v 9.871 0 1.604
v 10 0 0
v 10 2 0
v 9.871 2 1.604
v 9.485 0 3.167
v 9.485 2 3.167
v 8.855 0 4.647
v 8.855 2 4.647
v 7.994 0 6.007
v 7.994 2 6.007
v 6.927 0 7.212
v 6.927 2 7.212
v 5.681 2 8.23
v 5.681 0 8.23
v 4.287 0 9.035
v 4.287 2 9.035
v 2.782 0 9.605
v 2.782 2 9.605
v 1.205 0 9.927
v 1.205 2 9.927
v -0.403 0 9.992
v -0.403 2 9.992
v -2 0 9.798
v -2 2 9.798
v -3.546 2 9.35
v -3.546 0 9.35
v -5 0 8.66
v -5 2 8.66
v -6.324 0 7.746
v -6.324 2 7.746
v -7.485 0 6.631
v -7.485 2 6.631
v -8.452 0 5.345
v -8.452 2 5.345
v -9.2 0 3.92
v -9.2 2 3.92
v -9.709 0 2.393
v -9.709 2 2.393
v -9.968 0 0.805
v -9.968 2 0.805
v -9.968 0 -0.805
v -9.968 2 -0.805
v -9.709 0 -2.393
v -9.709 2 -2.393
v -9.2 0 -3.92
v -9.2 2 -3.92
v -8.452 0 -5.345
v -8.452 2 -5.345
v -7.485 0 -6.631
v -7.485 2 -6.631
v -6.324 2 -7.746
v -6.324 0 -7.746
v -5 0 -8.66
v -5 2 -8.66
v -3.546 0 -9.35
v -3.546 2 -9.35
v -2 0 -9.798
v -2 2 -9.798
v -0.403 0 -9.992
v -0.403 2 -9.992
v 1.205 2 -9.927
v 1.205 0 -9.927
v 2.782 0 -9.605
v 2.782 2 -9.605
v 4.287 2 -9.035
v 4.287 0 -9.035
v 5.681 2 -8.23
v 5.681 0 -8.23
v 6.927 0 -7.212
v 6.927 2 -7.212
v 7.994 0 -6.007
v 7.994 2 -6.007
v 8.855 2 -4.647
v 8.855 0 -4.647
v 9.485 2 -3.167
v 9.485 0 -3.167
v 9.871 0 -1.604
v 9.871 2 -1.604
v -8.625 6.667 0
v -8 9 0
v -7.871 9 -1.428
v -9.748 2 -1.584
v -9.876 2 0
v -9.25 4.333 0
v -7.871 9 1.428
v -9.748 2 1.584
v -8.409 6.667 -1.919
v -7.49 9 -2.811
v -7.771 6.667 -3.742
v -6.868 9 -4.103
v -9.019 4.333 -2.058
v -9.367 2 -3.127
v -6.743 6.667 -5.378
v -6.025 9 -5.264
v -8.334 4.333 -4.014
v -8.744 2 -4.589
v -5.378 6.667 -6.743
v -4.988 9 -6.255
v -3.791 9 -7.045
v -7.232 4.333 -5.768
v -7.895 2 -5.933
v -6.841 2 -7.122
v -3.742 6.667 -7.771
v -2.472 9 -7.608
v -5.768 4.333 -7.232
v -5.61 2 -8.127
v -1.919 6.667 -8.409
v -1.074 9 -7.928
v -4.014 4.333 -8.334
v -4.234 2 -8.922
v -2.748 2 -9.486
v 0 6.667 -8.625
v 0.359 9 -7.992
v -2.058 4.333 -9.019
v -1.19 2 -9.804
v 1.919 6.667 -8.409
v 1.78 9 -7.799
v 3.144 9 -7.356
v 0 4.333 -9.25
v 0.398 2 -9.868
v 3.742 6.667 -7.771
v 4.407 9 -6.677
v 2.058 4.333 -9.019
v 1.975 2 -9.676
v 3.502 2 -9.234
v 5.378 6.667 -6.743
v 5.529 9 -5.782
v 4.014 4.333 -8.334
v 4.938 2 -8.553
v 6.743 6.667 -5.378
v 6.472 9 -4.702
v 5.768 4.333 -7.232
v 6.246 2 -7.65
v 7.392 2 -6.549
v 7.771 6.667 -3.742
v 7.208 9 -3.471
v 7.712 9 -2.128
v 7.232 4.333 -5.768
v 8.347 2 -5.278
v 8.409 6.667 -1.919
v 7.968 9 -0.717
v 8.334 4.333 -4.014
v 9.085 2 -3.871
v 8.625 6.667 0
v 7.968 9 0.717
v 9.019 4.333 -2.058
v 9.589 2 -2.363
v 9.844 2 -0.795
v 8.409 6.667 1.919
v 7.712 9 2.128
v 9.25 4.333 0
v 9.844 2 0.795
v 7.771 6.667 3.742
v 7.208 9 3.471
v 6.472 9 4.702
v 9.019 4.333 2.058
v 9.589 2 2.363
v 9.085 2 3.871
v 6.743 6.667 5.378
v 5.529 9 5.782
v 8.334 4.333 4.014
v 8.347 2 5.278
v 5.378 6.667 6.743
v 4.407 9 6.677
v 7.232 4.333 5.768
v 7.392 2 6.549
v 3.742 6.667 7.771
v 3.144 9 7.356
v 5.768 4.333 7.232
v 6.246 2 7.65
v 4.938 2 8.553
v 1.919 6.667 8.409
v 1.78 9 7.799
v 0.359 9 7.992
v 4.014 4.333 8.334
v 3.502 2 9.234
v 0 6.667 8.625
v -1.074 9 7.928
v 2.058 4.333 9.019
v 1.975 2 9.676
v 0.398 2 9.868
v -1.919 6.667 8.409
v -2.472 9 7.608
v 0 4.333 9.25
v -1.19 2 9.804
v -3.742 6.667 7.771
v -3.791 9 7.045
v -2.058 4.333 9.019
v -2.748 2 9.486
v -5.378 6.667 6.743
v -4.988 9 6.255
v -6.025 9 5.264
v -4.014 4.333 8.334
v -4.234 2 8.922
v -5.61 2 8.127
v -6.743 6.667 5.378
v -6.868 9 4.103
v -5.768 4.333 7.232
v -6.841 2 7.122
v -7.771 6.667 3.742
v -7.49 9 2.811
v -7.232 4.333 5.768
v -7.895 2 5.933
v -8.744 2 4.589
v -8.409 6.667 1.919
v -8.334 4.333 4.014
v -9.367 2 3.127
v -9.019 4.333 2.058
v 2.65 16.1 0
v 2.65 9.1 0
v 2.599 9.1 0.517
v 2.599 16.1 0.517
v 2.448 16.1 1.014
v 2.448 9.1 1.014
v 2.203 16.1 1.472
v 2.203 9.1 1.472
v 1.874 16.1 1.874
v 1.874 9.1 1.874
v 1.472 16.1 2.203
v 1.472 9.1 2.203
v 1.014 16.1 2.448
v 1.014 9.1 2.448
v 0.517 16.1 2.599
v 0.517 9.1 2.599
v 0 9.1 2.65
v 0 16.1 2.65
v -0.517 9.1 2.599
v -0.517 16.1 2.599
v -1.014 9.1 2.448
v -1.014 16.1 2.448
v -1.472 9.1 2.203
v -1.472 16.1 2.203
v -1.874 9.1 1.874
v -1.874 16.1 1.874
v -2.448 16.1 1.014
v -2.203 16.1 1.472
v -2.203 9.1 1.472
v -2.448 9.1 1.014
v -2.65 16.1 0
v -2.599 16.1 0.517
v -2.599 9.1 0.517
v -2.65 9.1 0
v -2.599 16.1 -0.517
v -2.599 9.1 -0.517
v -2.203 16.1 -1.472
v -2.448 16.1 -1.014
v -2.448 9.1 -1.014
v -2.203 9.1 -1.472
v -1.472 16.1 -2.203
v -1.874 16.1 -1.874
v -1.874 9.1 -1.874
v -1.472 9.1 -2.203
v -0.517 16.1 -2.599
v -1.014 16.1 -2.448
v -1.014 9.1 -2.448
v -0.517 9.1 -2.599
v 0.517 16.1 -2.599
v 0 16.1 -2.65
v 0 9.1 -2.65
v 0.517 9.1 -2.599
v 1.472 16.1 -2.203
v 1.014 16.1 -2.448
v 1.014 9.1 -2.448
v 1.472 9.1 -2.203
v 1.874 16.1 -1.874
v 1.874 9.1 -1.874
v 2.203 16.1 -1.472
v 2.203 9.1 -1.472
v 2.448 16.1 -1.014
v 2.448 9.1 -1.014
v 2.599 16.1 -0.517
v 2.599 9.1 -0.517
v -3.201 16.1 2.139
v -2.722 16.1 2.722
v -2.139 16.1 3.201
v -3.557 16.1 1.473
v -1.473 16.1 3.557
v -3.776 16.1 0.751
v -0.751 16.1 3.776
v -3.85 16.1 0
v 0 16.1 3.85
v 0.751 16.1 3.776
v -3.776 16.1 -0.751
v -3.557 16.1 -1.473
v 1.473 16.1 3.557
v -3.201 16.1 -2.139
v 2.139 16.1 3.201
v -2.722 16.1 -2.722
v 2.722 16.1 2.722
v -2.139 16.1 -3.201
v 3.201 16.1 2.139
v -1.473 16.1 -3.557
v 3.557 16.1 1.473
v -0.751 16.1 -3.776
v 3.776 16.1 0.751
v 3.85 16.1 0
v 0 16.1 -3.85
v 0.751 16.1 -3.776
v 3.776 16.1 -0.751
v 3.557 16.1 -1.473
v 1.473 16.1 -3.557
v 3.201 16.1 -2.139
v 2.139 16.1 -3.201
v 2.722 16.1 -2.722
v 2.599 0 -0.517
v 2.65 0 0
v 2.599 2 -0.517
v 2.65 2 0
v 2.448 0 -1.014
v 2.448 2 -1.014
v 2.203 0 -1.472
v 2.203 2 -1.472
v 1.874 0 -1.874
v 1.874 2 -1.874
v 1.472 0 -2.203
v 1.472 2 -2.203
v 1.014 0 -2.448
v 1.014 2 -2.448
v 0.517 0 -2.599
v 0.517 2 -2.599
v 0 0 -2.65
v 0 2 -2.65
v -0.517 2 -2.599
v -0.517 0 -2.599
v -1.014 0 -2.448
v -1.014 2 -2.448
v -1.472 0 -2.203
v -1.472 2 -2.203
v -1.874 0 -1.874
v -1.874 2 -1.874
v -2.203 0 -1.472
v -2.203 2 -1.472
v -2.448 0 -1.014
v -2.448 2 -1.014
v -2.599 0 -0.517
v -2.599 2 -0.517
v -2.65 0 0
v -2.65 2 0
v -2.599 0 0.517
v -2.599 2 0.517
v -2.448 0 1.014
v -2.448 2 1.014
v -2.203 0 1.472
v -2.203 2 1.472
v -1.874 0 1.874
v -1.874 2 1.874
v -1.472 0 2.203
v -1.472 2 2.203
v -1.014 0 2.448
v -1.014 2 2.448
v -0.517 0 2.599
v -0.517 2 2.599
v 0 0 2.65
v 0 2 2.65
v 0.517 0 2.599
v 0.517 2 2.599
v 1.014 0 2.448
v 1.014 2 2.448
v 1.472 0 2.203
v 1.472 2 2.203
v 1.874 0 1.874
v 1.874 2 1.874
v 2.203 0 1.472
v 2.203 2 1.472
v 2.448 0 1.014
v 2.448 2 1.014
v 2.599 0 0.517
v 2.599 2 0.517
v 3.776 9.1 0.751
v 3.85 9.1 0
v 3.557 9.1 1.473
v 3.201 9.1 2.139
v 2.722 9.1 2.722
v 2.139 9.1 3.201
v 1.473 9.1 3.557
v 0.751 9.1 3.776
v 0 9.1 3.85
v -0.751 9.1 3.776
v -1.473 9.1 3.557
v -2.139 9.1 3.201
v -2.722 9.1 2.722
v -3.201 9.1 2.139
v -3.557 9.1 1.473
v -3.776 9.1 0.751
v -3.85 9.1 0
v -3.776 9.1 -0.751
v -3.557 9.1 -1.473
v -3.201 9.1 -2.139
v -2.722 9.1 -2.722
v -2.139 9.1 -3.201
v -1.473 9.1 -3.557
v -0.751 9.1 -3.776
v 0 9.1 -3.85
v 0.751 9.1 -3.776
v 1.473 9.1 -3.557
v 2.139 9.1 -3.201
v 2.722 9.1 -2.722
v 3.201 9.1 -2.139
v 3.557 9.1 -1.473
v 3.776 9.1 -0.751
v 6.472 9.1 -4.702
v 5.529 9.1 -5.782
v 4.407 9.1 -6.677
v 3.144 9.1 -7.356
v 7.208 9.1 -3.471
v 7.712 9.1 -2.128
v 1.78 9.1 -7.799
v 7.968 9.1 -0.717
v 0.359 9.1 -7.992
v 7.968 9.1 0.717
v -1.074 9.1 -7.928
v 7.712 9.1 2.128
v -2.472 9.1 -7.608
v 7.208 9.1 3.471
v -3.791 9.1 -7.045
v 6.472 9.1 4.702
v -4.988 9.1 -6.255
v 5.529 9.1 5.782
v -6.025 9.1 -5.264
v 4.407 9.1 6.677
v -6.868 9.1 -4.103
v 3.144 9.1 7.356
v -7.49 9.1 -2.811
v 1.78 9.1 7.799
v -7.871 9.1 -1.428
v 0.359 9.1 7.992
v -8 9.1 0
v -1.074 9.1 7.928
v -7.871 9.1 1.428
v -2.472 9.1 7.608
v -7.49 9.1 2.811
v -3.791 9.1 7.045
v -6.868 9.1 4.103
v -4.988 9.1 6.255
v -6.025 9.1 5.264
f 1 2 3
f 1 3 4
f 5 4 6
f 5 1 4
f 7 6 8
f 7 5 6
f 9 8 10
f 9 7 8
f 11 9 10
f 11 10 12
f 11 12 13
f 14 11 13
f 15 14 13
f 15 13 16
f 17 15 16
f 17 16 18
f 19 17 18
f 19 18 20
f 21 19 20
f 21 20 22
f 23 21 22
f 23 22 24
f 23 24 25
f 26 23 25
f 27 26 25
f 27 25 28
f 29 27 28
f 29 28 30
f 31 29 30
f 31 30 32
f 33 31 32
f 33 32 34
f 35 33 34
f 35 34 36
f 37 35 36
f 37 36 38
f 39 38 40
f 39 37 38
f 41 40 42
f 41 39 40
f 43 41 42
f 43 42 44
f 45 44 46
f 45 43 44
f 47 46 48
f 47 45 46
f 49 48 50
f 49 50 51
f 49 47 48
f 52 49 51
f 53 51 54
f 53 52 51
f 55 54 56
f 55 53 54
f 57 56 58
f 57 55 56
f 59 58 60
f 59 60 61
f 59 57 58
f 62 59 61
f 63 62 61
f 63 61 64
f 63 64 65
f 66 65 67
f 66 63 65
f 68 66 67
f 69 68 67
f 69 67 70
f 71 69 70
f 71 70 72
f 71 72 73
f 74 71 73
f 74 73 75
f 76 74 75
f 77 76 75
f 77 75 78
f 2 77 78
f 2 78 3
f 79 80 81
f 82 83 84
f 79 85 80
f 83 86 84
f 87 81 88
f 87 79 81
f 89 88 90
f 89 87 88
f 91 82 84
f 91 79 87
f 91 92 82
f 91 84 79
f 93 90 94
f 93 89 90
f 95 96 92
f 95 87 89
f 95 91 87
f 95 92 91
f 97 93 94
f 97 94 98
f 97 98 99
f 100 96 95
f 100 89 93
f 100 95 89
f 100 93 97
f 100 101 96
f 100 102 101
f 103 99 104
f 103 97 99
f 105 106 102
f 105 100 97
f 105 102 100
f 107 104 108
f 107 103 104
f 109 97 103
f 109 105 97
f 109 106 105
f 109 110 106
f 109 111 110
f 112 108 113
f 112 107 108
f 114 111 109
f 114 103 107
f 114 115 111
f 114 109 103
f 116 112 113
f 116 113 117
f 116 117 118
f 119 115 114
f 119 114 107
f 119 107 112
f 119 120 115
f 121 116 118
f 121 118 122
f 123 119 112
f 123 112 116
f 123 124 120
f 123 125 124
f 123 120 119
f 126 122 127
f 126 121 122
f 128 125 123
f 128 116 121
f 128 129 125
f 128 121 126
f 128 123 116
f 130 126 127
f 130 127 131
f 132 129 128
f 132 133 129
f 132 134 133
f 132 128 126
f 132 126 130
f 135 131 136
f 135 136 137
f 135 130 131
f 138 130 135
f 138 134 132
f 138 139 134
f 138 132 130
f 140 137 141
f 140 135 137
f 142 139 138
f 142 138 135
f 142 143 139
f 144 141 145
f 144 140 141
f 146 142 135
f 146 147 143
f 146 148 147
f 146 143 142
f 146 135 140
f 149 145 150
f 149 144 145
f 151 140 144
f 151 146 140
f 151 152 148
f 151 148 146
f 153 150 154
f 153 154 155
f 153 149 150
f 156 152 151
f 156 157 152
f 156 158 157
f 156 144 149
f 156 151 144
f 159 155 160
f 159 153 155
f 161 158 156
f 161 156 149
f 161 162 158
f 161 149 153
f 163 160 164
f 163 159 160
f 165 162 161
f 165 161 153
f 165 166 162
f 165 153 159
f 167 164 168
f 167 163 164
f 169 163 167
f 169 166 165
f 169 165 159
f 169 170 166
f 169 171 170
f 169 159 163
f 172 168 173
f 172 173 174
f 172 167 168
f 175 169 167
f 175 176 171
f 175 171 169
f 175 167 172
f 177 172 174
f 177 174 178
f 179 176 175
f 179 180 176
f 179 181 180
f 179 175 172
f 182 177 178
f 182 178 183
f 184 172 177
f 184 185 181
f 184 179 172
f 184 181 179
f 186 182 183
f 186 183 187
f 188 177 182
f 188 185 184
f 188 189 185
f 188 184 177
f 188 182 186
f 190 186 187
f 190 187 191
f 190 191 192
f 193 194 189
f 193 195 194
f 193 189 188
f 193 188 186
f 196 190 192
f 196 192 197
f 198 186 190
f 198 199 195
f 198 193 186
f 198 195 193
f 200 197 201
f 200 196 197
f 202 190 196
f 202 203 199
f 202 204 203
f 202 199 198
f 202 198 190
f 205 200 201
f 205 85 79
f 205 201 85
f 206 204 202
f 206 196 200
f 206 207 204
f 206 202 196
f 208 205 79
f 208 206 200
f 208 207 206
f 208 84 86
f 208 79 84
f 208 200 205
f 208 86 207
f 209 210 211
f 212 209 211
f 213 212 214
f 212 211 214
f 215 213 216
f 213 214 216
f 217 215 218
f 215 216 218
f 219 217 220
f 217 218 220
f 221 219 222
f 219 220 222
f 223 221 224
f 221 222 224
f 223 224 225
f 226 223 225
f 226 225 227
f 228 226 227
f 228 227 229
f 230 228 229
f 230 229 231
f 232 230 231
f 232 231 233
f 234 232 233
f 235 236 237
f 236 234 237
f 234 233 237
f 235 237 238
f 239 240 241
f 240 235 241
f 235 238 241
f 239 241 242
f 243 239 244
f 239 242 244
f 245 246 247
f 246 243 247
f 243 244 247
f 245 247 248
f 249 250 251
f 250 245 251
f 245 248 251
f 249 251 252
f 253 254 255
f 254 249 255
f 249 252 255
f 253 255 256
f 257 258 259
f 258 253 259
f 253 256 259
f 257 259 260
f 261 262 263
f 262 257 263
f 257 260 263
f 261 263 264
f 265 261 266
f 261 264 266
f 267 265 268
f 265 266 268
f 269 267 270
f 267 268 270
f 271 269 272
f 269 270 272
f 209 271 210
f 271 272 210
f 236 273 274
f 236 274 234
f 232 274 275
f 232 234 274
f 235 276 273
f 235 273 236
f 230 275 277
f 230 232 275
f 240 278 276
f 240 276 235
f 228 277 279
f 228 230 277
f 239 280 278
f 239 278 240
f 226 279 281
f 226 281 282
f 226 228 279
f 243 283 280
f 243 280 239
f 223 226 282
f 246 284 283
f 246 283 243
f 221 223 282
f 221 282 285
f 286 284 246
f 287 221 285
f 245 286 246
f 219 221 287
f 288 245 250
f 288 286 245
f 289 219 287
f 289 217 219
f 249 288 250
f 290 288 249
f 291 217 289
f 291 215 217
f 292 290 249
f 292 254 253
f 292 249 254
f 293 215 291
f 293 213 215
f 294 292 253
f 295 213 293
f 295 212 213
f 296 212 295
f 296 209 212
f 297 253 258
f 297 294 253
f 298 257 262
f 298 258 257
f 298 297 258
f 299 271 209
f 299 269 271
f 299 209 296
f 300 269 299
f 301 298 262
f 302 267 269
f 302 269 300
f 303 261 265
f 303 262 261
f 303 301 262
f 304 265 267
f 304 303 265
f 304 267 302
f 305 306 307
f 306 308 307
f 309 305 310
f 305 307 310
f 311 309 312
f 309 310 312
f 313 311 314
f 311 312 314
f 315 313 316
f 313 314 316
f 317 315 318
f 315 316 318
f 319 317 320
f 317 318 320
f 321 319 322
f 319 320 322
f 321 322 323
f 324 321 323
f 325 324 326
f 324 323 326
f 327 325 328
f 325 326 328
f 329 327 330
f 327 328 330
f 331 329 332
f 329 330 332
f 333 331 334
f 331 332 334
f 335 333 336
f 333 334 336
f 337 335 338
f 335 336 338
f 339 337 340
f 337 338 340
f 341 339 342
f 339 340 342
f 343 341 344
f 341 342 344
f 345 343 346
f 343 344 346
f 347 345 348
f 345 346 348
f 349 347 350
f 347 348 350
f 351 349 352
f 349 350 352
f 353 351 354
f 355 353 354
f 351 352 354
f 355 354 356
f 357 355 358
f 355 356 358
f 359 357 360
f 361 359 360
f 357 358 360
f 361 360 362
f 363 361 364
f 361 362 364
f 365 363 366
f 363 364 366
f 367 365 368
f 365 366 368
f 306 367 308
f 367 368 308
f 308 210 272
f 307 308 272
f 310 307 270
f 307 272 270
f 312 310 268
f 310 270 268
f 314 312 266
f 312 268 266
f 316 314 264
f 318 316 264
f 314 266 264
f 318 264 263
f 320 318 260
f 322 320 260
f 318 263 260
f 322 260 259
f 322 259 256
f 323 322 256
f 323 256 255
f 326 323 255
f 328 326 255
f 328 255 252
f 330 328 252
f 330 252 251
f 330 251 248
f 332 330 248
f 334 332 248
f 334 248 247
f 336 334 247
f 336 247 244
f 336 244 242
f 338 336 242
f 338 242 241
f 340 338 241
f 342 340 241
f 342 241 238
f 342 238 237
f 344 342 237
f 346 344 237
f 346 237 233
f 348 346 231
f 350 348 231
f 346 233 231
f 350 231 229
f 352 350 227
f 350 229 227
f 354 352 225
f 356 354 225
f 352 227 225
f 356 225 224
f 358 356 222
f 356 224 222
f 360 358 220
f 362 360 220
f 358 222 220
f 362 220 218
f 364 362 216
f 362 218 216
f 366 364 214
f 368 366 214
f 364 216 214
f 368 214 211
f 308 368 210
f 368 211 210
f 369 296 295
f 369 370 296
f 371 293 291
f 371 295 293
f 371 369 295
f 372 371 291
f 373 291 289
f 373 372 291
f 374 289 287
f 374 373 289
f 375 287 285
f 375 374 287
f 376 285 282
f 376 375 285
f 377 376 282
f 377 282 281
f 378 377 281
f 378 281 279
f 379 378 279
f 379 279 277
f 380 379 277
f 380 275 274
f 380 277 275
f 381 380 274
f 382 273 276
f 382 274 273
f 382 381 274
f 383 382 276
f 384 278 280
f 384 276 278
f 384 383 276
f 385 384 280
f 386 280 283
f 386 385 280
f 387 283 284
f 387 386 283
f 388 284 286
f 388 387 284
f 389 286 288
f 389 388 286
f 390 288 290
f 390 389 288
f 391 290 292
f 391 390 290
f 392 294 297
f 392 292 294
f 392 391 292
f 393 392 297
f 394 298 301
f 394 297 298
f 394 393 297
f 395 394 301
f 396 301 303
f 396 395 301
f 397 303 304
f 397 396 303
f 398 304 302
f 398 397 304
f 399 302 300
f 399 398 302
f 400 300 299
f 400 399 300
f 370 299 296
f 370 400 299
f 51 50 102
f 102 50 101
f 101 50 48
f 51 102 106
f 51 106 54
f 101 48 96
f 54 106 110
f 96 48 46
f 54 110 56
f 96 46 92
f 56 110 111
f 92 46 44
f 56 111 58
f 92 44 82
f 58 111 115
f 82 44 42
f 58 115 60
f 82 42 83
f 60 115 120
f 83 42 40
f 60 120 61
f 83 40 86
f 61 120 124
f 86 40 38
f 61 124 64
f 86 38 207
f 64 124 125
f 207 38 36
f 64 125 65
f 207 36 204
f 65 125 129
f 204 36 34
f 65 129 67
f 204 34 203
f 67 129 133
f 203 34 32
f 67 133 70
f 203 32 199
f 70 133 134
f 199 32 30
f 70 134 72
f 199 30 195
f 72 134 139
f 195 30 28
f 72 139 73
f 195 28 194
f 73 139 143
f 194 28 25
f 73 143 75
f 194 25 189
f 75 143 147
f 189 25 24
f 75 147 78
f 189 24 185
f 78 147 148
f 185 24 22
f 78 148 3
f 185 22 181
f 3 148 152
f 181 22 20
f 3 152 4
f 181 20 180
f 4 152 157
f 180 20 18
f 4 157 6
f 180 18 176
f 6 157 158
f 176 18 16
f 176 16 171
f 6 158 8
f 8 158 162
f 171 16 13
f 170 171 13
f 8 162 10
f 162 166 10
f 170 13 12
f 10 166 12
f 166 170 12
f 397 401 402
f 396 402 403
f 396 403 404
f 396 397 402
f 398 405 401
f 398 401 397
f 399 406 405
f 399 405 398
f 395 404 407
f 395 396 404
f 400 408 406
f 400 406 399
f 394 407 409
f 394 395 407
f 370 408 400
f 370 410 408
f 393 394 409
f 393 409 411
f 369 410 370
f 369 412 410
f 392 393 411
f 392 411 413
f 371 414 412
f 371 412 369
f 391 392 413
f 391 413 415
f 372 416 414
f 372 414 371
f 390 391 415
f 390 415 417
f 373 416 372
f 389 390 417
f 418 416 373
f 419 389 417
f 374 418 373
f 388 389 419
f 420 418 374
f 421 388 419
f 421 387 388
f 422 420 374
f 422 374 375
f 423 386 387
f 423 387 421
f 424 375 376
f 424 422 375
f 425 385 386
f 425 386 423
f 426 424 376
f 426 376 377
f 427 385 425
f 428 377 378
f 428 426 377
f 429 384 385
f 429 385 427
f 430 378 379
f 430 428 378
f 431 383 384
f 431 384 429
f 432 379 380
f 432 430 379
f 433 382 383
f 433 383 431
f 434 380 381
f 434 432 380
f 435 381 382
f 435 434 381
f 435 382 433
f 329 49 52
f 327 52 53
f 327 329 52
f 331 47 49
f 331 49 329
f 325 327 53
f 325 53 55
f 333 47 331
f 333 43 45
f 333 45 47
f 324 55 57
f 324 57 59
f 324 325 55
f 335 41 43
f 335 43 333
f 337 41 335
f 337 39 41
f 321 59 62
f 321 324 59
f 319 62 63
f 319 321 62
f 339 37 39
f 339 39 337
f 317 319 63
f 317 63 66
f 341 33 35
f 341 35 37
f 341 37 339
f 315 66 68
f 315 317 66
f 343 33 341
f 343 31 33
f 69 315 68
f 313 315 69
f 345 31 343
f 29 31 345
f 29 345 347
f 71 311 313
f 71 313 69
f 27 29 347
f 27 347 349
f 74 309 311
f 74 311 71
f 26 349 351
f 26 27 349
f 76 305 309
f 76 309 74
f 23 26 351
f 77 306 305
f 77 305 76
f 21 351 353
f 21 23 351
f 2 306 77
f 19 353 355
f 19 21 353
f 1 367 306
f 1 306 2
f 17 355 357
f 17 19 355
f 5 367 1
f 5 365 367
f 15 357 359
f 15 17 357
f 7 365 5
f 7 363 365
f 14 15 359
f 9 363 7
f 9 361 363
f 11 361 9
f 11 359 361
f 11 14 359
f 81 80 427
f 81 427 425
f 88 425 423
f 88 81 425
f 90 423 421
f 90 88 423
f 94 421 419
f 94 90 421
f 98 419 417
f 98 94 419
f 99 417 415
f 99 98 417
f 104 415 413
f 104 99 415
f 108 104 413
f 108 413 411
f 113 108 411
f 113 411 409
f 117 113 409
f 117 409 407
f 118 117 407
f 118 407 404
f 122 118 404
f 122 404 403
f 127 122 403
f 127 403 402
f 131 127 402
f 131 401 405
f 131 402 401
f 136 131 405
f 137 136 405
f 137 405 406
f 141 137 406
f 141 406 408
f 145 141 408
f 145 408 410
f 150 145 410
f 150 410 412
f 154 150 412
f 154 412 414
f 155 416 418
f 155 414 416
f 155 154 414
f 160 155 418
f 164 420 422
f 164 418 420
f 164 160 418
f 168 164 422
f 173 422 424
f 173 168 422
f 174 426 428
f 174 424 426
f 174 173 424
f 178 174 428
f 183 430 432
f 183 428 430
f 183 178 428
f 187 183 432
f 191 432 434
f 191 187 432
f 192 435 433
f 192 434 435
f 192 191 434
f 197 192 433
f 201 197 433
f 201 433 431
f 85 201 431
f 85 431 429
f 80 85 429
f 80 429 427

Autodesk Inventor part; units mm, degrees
ref_plane "YZ Plane" through (0, 0, 0) normal (1, 0, 0) x (0, 1, 0)
ref_plane "XZ Plane" through (0, 0, 0) normal (0, 1, 0) x (-1, 0, 0)
ref_plane "XY Plane" through (0, 0, 0) normal (0, 0, 1) x (1, 0, 0)
sketch "Boceto1" plane through (0, 0, 0) normal (0, 1, 0) x (-1, 0, 0)
  circle A0 centre (0, 0) radius 8
  dimension "d0" = 16
extrude "Extrusión1" add sketch "Boceto1" along normal blind 9.1
sketch "Boceto2" plane through (0, 9.1, 0) normal (0, 1, 0) x (1, 0, 0)
  circle A0 centre (0, 0) radius 2.65
  dimension "d3" = 5.3
extrude "Extrusión2" cut sketch "Boceto2" against normal through all
sketch "Boceto3" plane through (0, 9.1, 0) normal (0, 1, 0) x (1, 0, 0)
  circle A0 centre (0, 0) radius 3.85
  circle A1 centre (0, 0) radius 2.65 projected
  dimension "d6" = 7.7
extrude "Extrusión3" add sketch "Boceto3" along normal blind 7
sketch "Boceto4" plane through (0, 0, 0) normal (0, -1, 0) x (1, 0, 0)
  circle A0 centre (0, 0) radius 10
  dimension "d9" = 20
extrude "Extrusión4" add sketch "Boceto4" against normal blind 2
chamfer "Chaflán1" distance 7 angle 15 1 edges at (8, 2, 0) measured on face at (-7.8964, 4.3667, 1.2833)
sketch "Boceto5" plane through (0, 2, 0) normal (0, 1, 0) x (1, 0, 0)
  circle A0 centre (0, 0) radius 2.65 projected
extrude "Extrusión5" cut sketch "Boceto5" against normal through all
properties part number "elbowsupport"
